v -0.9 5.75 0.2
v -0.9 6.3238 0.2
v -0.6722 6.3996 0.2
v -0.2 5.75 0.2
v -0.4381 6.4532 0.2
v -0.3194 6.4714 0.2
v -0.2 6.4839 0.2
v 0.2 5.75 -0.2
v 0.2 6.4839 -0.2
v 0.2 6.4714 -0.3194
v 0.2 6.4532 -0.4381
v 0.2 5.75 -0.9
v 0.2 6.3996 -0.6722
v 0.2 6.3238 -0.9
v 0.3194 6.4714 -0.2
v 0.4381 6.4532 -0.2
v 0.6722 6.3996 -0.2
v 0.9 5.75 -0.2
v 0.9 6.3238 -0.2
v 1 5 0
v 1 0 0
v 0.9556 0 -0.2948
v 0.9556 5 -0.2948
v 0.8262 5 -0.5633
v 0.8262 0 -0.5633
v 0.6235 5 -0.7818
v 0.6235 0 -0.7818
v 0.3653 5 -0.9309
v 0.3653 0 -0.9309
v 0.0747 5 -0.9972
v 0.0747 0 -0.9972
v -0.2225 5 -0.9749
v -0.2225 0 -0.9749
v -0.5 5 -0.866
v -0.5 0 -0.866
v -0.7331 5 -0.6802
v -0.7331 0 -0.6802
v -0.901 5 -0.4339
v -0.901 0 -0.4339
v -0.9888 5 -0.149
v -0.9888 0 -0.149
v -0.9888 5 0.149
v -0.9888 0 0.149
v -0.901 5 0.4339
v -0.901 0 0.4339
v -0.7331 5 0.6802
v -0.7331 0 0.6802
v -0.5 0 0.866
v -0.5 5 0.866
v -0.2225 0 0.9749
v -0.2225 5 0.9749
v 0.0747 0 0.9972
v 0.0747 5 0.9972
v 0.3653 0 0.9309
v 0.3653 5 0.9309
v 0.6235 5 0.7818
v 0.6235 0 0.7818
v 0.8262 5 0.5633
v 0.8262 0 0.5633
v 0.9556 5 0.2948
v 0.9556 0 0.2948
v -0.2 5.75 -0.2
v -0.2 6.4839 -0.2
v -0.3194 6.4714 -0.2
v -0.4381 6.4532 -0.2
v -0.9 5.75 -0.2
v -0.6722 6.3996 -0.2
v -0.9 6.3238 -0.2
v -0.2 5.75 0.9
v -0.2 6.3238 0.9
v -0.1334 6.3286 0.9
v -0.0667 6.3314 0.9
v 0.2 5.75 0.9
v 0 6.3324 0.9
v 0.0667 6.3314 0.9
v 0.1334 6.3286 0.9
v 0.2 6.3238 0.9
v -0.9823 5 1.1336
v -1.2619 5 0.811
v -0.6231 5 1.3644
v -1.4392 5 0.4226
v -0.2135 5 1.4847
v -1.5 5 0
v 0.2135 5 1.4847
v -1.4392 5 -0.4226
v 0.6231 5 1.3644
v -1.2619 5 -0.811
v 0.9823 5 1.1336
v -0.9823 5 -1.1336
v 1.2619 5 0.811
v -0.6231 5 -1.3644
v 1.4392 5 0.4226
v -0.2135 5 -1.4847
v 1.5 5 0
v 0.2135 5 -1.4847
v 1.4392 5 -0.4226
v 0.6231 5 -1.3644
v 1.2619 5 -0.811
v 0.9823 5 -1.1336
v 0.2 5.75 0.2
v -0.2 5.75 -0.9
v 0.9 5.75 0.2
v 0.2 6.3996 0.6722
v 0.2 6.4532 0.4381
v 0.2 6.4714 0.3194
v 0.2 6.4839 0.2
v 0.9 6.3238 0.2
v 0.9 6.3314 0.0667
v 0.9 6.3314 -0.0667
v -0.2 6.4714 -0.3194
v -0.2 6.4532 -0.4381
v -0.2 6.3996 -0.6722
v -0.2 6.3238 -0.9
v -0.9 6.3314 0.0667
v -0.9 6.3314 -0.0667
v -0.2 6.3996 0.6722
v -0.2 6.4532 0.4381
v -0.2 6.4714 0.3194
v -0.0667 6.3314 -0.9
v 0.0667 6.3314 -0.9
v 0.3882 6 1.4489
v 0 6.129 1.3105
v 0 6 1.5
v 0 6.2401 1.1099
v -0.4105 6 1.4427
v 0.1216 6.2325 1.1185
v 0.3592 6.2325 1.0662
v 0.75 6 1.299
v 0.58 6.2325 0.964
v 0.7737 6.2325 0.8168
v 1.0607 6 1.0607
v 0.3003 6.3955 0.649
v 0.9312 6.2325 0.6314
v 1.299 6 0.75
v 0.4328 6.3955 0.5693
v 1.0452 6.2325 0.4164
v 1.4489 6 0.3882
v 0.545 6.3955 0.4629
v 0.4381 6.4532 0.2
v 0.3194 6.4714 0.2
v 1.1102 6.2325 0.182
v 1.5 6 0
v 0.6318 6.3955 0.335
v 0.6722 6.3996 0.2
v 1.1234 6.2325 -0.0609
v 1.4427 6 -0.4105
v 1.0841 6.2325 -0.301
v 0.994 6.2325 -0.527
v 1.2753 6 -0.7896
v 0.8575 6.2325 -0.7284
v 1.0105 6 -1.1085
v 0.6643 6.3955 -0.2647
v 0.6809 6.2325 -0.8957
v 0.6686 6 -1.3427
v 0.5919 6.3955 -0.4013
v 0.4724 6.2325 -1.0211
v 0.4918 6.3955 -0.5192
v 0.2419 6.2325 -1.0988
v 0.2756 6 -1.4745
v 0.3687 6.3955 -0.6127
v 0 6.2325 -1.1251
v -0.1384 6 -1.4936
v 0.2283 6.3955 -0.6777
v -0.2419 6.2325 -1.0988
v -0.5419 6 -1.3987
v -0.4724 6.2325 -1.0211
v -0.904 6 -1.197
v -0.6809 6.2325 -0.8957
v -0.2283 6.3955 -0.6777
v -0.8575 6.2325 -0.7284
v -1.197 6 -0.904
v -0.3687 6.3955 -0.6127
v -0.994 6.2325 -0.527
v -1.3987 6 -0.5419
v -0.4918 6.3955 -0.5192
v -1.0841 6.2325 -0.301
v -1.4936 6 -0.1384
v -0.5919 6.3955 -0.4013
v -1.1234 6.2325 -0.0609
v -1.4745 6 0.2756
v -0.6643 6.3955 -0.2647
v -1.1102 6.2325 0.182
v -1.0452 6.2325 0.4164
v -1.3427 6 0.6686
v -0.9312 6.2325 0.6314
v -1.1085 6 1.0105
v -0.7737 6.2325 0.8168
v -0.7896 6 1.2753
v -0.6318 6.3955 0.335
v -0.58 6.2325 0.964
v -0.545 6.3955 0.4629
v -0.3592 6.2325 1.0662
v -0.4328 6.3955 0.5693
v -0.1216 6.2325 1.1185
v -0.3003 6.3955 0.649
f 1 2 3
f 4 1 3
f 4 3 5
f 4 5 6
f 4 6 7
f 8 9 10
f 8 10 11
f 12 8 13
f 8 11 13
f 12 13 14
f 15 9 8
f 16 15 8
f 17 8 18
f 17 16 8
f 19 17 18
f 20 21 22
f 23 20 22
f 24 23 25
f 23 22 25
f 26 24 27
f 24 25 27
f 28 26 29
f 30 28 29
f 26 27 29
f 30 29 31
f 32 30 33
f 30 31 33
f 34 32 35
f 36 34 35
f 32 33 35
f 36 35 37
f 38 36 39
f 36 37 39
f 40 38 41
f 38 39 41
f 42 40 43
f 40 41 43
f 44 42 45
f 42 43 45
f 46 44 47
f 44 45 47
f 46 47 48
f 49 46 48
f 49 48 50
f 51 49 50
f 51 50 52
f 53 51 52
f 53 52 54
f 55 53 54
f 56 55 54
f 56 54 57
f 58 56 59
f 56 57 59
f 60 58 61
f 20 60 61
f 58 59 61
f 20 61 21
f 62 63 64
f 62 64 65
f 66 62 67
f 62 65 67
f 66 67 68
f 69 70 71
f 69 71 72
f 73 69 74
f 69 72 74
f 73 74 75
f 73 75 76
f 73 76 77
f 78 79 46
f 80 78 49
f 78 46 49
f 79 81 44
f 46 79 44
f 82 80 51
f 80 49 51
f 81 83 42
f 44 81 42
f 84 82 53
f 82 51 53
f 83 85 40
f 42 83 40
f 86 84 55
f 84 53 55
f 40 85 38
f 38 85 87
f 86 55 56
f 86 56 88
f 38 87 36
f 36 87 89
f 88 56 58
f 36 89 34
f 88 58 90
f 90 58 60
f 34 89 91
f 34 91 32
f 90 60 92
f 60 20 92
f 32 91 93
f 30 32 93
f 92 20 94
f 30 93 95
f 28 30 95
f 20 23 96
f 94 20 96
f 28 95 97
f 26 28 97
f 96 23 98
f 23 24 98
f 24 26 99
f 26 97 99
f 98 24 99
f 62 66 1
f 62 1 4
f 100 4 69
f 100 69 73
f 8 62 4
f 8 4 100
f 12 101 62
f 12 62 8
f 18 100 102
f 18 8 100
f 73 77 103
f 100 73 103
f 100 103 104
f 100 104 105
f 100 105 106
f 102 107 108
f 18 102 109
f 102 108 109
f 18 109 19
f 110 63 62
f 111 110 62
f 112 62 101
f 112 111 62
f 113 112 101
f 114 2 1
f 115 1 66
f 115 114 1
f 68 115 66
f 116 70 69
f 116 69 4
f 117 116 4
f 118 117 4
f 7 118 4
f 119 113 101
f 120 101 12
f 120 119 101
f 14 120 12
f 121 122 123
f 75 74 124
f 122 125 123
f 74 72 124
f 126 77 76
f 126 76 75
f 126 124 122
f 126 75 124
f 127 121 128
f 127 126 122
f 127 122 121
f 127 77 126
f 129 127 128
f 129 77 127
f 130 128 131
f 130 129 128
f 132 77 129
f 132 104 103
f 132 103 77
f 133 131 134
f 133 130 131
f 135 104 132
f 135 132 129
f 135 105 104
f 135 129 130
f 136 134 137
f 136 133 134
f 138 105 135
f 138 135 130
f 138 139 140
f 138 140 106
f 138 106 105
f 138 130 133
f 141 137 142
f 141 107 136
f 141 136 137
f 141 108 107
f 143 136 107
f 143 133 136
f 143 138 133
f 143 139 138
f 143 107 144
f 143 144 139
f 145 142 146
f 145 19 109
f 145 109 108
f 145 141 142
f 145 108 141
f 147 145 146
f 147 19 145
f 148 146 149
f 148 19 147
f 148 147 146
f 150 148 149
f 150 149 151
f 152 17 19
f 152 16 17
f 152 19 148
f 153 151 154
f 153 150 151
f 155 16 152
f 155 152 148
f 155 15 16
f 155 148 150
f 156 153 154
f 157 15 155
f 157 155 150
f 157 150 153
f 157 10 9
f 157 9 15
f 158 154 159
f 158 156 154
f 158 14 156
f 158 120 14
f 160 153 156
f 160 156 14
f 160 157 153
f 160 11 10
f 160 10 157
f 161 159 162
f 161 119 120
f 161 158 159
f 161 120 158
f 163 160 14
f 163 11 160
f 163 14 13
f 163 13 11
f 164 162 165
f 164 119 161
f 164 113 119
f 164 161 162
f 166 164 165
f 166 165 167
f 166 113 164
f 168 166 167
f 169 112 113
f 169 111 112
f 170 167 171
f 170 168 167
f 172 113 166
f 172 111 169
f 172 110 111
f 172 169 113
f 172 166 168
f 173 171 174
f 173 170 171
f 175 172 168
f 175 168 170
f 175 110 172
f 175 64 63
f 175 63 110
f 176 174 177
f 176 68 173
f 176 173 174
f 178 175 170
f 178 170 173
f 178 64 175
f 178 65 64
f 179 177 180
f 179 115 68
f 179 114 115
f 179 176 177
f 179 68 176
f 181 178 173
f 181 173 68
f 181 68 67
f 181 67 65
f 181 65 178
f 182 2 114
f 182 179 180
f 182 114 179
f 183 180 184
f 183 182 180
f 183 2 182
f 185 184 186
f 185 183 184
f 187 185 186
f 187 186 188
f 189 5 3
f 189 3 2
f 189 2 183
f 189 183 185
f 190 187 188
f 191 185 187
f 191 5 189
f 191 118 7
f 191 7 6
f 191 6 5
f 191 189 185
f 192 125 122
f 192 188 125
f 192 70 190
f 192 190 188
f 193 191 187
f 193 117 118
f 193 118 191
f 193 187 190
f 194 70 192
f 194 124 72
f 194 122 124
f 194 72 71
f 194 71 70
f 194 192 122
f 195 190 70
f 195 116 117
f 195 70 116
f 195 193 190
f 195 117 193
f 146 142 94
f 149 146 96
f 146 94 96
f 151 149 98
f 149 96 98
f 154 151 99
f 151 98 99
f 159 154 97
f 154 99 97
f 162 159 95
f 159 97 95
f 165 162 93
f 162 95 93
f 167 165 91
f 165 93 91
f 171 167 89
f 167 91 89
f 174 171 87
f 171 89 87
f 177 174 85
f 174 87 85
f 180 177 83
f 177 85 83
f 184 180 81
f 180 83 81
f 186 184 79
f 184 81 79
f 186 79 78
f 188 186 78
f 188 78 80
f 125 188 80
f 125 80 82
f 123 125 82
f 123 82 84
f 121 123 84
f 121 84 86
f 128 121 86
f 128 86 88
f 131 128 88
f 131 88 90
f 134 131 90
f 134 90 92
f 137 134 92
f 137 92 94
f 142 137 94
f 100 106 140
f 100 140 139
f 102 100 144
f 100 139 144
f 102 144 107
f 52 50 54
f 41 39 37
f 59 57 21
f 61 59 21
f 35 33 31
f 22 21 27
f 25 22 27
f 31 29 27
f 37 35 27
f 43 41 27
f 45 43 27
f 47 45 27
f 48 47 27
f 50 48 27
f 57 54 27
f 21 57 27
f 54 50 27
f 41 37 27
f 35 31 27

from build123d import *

# Parameters (mm, degrees)
SKETCH1_R           = 1
BOSS_EXTRUDE1_DEPTH = 5
SKETCH2_R           = 1.5
BOSS_EXTRUDE2_DEPTH = 1
DOME1_FACE_RADIUS   = 1.5
DOME1_HEIGHT        = 0.5
SKETCH3_W           = 0.7
SKETCH3_H           = 0.4
SKETCH3_W_2         = 0.4
SKETCH3_H_2         = 0.7
CUT_EXTRUDE1_DEPTH  = 0.75


with BuildPart() as part:
    # Sketch1 → Boss-Extrude1 (new body)
    with BuildSketch(Plane(origin=(0, 0, 0), x_dir=(1, 0, 0), z_dir=(0, 1, 0))):
        Circle(SKETCH1_R)
    extrude(amount=BOSS_EXTRUDE1_DEPTH)

    # Sketch2 → Boss-Extrude2 (add)
    with BuildSketch(Plane(origin=(0, 5, 0), x_dir=(1, 0, 0), z_dir=(0, 1, 0))):
        Circle(SKETCH2_R)
    extrude(amount=BOSS_EXTRUDE2_DEPTH)

    # Dome1: a dome of height H over a round flat face of radius A is a cap of a sphere of radius (A * A + H * H) / (2 * H)
    dome1_r = (DOME1_FACE_RADIUS * DOME1_FACE_RADIUS + DOME1_HEIGHT * DOME1_HEIGHT) / (2 * DOME1_HEIGHT)
    dome1_base = Plane((0, 6, 0), z_dir=(0, 1, 0))
    with Locations(dome1_base.offset(DOME1_HEIGHT - dome1_r)):
        dome1_ball = Sphere(dome1_r, mode=Mode.PRIVATE)
    add(split(dome1_ball, bisect_by=dome1_base, keep=Keep.TOP, mode=Mode.PRIVATE))

    # Sketch3 → Cut-Extrude1 (cut)
    with BuildSketch(Plane(origin=(0, 6.5, 0), x_dir=(1, 0, 0), z_dir=(0, 1, 0))):
        with Locations((-0.55, 0)):
            Rectangle(SKETCH3_W, SKETCH3_H)
        Rectangle(SKETCH3_W_2, SKETCH3_H)
        with Locations((0, 0.55)):
            Rectangle(SKETCH3_W_2, SKETCH3_H_2)
        with Locations((0.55, 0)):
            Rectangle(SKETCH3_W, SKETCH3_H)
        with Locations((0, -0.55)):
            Rectangle(SKETCH3_W_2, SKETCH3_H_2)
    extrude(amount=-CUT_EXTRUDE1_DEPTH, mode=Mode.SUBTRACT)


solid = part.part
